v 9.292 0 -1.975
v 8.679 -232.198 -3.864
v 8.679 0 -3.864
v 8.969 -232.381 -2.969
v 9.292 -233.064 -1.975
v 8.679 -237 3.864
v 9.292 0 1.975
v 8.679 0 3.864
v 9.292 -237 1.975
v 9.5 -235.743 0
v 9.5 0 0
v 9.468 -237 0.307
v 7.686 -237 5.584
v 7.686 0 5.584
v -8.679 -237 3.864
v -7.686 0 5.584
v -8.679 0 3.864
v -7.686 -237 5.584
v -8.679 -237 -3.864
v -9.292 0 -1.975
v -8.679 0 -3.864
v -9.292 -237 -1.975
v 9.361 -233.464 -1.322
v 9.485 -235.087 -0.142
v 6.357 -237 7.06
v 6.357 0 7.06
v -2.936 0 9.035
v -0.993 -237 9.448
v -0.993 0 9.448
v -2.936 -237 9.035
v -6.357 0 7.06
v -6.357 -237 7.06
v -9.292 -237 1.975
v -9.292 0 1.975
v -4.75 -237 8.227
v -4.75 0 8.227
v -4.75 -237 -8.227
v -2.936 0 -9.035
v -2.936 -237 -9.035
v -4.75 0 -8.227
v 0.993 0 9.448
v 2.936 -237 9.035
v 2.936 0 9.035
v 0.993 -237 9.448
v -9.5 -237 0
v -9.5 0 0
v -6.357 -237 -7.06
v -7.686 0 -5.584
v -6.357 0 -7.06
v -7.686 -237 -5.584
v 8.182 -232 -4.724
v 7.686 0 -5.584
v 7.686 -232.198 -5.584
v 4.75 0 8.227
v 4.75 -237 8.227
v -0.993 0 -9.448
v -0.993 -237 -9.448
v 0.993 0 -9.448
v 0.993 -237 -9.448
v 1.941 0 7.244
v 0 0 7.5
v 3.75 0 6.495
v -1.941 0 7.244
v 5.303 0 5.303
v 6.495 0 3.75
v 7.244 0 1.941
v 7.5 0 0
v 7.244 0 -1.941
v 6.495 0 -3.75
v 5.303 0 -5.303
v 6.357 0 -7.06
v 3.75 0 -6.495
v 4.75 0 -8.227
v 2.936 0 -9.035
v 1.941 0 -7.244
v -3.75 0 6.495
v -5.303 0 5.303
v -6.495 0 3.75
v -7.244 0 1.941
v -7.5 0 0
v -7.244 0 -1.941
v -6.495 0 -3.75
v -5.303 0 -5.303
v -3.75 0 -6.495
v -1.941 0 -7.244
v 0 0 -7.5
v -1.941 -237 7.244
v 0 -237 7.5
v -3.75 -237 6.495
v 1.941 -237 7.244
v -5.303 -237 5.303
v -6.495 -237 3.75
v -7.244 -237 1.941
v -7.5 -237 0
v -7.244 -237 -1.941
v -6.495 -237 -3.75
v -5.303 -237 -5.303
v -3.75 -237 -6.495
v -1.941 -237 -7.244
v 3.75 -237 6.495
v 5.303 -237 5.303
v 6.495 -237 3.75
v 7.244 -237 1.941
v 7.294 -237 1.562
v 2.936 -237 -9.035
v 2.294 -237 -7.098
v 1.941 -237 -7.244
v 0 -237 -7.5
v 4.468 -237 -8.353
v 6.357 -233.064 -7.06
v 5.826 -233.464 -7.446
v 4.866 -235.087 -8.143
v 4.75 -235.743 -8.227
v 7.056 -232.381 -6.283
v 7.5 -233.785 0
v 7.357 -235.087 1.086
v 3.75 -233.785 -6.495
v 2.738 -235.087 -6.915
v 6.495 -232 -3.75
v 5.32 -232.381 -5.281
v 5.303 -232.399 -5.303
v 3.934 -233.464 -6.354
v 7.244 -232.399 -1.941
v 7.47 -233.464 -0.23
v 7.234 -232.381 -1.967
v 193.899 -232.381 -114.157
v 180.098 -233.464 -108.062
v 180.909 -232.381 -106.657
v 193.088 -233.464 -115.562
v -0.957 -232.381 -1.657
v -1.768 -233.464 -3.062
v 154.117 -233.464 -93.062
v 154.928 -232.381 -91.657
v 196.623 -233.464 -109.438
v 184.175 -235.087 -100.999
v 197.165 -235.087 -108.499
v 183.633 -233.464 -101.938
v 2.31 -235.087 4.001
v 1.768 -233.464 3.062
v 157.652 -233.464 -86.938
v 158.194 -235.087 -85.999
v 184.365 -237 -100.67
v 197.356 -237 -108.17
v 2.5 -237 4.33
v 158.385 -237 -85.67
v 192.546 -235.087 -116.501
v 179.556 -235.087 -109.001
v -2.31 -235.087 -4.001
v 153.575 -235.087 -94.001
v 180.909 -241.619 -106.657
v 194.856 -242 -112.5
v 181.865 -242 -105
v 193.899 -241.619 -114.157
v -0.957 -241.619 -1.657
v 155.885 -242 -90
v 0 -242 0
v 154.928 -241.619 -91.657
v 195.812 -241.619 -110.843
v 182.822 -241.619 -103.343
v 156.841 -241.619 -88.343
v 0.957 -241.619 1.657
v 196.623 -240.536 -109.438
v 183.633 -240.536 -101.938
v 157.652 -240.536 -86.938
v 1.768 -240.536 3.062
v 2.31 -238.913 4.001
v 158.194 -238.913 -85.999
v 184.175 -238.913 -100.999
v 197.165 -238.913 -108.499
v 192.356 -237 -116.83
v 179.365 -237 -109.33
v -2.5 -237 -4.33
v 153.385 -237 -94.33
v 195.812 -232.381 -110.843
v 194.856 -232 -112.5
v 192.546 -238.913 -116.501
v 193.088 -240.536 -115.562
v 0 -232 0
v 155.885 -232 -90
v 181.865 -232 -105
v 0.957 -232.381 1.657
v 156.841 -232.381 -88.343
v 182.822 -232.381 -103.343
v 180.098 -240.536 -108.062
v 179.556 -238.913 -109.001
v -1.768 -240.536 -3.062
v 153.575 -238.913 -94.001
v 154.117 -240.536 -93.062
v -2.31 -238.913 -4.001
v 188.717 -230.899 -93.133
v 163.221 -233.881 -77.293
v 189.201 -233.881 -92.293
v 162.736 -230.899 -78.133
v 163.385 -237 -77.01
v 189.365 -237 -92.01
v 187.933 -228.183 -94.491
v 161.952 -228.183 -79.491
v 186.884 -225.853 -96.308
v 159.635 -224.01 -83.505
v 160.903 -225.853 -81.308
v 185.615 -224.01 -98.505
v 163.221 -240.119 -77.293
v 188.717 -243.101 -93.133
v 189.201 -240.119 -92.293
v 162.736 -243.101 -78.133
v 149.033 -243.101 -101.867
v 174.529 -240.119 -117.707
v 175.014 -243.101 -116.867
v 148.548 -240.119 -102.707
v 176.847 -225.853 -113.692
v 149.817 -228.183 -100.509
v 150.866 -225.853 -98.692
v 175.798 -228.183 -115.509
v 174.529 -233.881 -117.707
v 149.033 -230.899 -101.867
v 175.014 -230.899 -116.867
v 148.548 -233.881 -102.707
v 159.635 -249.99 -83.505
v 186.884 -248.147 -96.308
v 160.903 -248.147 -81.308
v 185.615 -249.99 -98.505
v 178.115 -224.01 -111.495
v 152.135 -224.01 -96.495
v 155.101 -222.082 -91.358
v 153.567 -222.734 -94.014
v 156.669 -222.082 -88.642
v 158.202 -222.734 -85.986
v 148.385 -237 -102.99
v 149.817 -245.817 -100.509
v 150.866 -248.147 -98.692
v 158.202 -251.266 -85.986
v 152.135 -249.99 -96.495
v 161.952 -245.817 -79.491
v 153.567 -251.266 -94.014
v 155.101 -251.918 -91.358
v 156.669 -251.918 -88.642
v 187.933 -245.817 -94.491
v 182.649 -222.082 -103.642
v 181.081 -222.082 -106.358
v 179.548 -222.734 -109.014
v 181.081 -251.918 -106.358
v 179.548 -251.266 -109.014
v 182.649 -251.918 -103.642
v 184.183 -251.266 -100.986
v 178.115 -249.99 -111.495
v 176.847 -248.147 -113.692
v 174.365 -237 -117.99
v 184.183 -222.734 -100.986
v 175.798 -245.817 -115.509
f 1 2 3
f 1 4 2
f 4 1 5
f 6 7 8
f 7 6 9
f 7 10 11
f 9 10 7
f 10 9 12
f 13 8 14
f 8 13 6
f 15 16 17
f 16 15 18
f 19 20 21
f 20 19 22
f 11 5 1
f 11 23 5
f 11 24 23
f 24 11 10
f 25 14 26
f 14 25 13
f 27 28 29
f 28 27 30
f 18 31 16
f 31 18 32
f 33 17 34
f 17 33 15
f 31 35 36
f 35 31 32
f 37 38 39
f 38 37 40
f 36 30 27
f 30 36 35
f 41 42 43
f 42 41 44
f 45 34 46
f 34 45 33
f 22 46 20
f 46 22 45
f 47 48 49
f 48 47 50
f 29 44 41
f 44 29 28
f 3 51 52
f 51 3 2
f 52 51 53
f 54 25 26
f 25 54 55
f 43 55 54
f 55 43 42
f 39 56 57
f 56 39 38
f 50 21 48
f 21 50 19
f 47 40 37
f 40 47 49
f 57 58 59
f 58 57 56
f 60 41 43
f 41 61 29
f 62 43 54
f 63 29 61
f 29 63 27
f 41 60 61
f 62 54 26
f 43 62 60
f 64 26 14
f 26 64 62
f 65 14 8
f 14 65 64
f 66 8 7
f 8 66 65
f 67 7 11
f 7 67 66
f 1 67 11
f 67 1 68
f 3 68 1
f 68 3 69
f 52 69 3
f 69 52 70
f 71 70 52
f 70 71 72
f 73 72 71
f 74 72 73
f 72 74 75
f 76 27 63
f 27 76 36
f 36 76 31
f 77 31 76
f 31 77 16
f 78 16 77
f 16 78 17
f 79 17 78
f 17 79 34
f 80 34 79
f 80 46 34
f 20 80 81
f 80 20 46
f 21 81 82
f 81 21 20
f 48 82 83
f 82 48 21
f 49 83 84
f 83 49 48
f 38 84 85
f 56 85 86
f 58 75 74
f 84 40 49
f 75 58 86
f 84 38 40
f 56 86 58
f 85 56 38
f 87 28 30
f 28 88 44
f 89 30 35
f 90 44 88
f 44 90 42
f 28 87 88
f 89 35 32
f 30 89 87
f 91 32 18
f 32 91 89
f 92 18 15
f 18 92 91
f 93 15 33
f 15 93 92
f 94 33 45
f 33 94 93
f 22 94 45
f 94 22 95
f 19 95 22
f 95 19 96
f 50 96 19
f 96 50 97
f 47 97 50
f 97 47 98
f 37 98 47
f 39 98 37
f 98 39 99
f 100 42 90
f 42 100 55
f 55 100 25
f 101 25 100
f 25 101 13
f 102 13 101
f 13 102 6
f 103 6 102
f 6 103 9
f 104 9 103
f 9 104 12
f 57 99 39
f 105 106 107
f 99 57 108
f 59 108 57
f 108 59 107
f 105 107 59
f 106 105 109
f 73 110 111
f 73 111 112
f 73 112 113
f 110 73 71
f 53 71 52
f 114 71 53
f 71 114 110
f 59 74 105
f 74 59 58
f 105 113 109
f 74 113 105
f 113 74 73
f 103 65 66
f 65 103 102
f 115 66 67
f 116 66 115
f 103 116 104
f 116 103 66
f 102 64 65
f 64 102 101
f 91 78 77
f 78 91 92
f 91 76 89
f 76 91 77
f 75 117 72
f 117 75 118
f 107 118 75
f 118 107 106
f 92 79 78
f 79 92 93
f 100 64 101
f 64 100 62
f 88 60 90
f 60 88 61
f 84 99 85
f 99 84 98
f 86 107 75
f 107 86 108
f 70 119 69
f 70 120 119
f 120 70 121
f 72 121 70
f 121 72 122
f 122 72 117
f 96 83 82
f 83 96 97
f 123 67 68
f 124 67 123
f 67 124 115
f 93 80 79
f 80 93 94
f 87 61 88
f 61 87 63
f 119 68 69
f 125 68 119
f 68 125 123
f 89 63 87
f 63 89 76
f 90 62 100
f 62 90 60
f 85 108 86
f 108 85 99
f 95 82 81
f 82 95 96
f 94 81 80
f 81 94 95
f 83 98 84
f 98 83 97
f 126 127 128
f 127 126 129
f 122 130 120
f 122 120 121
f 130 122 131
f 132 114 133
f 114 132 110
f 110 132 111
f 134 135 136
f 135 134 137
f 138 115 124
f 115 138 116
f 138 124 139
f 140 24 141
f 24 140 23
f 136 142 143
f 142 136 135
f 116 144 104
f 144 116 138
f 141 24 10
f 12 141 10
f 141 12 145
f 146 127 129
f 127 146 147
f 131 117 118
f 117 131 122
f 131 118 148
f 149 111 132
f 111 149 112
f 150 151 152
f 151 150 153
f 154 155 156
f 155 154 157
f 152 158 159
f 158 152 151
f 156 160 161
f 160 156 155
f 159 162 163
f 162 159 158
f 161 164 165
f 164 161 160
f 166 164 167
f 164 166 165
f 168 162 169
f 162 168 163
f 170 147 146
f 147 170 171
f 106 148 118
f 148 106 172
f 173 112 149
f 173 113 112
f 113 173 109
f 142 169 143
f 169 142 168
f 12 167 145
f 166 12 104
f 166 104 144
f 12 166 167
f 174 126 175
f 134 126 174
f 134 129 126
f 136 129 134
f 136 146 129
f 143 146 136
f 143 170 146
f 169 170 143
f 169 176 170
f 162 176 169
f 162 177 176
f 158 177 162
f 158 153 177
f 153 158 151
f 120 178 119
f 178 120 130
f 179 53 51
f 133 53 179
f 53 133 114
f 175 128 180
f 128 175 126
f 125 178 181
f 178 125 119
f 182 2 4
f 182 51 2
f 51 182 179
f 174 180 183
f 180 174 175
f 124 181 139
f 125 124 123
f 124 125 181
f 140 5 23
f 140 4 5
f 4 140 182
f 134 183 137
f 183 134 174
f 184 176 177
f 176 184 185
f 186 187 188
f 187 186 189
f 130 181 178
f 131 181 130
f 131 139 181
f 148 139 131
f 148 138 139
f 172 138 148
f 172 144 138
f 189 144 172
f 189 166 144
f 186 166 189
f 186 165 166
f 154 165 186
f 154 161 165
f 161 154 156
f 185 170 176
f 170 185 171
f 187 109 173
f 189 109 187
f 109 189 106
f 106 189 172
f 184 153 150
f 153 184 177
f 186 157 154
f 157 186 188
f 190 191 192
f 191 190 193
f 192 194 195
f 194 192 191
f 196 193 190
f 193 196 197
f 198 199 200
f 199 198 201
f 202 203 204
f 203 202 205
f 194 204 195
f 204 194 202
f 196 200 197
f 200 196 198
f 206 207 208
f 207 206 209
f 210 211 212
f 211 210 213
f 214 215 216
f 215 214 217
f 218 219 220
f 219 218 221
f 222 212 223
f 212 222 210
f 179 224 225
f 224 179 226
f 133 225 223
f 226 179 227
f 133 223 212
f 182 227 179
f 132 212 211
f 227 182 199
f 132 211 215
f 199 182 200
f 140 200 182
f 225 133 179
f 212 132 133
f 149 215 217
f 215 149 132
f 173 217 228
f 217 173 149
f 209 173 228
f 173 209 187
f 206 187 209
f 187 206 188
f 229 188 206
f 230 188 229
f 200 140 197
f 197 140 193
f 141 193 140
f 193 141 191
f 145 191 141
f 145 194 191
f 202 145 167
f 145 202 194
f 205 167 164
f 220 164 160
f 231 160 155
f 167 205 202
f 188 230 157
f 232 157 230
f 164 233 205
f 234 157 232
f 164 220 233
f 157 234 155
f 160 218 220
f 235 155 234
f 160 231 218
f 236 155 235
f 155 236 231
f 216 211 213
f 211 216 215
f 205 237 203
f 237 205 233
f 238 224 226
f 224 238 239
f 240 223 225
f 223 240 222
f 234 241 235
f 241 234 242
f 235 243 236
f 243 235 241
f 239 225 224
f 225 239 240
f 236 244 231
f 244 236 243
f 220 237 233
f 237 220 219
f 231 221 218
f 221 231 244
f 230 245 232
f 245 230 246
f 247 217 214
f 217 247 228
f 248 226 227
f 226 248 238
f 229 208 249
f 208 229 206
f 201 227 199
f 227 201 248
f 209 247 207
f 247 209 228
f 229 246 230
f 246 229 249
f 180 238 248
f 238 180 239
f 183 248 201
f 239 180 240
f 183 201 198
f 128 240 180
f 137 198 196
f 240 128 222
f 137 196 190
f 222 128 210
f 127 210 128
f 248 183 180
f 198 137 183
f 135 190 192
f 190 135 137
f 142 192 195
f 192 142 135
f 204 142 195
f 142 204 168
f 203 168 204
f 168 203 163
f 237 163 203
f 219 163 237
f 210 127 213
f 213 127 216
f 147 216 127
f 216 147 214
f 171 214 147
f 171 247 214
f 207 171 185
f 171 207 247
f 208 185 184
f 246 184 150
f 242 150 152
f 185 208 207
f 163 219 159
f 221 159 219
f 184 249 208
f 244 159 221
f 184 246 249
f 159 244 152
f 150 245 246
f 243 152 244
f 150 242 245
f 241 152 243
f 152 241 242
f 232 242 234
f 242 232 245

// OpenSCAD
// ==================== PARÁMETROS ====================
L_pendulo = 225;          
L_peso = 30;              
r_peso = 15;
r_varilla = 5;

armlength = 237;
pared = 2;
diam_tubo_arm = 19;
radio_ext = diam_tubo_arm / 2;
radio_int = radio_ext - pared;

// ==================== MÓDULOS ====================

// Brazo: se extiende a lo largo del eje Y positivo
module arm(){
    rotate([90, 0, 0]) {
        difference(){
            cylinder(h=armlength, r=radio_ext, center=false);
            cylinder(h=armlength + 2, r=radio_int, center=false);
        }
    }
}

// Péndulo: su PIVOTE está en el origen (parte superior de la varilla)
module pendulo(angulo){
    rotate([0, -angulo, 0]) { // Gira alrededor del eje Y (eje del brazo)
        // Varilla (baja desde 0 hasta -225)
        translate([0, 0, -L_pendulo])
            cylinder(h=L_pendulo, r=r_varilla, center=false);
        // Peso (situado a 15mm del extremo)
        translate([0, 0, -210])
            cylinder(h=L_peso, r=r_peso, center=false);
    }
}

// Sistema completo del péndulo de Furuta
module furuta(theta, alpha){
    rotate([0, 0, theta]) {        // 1. Rotación del brazo en el plano horizontal
        color("orangered")
        arm();                      // Dibuja el brazo desde el origen
        
        color("gray")
        translate([0,-armlength, 0]) { // 2. Traslada al extremo del brazo
            pendulo(alpha);          // 3. Dibuja el péndulo con su inclinación
        }
    }
}

// ==================== PÉNDULO AMORTIGUADO ====================
// Oscilación con decaimiento exponencial (péndulo real que desacelera)

A0    = 60;    // Amplitud inicial en grados
omega = 600;   // Frecuencia angular (grados por unidad de tiempo)
lambda = 1.0;  // Coeficiente de amortiguamiento (mayor = frena más rápido)

// Ángulo: A0 * e^(-lambda*t) * cos(omega*t)
alpha = A0 * exp(-lambda * $t) * cos(omega * $t);

furuta(0, alpha);
